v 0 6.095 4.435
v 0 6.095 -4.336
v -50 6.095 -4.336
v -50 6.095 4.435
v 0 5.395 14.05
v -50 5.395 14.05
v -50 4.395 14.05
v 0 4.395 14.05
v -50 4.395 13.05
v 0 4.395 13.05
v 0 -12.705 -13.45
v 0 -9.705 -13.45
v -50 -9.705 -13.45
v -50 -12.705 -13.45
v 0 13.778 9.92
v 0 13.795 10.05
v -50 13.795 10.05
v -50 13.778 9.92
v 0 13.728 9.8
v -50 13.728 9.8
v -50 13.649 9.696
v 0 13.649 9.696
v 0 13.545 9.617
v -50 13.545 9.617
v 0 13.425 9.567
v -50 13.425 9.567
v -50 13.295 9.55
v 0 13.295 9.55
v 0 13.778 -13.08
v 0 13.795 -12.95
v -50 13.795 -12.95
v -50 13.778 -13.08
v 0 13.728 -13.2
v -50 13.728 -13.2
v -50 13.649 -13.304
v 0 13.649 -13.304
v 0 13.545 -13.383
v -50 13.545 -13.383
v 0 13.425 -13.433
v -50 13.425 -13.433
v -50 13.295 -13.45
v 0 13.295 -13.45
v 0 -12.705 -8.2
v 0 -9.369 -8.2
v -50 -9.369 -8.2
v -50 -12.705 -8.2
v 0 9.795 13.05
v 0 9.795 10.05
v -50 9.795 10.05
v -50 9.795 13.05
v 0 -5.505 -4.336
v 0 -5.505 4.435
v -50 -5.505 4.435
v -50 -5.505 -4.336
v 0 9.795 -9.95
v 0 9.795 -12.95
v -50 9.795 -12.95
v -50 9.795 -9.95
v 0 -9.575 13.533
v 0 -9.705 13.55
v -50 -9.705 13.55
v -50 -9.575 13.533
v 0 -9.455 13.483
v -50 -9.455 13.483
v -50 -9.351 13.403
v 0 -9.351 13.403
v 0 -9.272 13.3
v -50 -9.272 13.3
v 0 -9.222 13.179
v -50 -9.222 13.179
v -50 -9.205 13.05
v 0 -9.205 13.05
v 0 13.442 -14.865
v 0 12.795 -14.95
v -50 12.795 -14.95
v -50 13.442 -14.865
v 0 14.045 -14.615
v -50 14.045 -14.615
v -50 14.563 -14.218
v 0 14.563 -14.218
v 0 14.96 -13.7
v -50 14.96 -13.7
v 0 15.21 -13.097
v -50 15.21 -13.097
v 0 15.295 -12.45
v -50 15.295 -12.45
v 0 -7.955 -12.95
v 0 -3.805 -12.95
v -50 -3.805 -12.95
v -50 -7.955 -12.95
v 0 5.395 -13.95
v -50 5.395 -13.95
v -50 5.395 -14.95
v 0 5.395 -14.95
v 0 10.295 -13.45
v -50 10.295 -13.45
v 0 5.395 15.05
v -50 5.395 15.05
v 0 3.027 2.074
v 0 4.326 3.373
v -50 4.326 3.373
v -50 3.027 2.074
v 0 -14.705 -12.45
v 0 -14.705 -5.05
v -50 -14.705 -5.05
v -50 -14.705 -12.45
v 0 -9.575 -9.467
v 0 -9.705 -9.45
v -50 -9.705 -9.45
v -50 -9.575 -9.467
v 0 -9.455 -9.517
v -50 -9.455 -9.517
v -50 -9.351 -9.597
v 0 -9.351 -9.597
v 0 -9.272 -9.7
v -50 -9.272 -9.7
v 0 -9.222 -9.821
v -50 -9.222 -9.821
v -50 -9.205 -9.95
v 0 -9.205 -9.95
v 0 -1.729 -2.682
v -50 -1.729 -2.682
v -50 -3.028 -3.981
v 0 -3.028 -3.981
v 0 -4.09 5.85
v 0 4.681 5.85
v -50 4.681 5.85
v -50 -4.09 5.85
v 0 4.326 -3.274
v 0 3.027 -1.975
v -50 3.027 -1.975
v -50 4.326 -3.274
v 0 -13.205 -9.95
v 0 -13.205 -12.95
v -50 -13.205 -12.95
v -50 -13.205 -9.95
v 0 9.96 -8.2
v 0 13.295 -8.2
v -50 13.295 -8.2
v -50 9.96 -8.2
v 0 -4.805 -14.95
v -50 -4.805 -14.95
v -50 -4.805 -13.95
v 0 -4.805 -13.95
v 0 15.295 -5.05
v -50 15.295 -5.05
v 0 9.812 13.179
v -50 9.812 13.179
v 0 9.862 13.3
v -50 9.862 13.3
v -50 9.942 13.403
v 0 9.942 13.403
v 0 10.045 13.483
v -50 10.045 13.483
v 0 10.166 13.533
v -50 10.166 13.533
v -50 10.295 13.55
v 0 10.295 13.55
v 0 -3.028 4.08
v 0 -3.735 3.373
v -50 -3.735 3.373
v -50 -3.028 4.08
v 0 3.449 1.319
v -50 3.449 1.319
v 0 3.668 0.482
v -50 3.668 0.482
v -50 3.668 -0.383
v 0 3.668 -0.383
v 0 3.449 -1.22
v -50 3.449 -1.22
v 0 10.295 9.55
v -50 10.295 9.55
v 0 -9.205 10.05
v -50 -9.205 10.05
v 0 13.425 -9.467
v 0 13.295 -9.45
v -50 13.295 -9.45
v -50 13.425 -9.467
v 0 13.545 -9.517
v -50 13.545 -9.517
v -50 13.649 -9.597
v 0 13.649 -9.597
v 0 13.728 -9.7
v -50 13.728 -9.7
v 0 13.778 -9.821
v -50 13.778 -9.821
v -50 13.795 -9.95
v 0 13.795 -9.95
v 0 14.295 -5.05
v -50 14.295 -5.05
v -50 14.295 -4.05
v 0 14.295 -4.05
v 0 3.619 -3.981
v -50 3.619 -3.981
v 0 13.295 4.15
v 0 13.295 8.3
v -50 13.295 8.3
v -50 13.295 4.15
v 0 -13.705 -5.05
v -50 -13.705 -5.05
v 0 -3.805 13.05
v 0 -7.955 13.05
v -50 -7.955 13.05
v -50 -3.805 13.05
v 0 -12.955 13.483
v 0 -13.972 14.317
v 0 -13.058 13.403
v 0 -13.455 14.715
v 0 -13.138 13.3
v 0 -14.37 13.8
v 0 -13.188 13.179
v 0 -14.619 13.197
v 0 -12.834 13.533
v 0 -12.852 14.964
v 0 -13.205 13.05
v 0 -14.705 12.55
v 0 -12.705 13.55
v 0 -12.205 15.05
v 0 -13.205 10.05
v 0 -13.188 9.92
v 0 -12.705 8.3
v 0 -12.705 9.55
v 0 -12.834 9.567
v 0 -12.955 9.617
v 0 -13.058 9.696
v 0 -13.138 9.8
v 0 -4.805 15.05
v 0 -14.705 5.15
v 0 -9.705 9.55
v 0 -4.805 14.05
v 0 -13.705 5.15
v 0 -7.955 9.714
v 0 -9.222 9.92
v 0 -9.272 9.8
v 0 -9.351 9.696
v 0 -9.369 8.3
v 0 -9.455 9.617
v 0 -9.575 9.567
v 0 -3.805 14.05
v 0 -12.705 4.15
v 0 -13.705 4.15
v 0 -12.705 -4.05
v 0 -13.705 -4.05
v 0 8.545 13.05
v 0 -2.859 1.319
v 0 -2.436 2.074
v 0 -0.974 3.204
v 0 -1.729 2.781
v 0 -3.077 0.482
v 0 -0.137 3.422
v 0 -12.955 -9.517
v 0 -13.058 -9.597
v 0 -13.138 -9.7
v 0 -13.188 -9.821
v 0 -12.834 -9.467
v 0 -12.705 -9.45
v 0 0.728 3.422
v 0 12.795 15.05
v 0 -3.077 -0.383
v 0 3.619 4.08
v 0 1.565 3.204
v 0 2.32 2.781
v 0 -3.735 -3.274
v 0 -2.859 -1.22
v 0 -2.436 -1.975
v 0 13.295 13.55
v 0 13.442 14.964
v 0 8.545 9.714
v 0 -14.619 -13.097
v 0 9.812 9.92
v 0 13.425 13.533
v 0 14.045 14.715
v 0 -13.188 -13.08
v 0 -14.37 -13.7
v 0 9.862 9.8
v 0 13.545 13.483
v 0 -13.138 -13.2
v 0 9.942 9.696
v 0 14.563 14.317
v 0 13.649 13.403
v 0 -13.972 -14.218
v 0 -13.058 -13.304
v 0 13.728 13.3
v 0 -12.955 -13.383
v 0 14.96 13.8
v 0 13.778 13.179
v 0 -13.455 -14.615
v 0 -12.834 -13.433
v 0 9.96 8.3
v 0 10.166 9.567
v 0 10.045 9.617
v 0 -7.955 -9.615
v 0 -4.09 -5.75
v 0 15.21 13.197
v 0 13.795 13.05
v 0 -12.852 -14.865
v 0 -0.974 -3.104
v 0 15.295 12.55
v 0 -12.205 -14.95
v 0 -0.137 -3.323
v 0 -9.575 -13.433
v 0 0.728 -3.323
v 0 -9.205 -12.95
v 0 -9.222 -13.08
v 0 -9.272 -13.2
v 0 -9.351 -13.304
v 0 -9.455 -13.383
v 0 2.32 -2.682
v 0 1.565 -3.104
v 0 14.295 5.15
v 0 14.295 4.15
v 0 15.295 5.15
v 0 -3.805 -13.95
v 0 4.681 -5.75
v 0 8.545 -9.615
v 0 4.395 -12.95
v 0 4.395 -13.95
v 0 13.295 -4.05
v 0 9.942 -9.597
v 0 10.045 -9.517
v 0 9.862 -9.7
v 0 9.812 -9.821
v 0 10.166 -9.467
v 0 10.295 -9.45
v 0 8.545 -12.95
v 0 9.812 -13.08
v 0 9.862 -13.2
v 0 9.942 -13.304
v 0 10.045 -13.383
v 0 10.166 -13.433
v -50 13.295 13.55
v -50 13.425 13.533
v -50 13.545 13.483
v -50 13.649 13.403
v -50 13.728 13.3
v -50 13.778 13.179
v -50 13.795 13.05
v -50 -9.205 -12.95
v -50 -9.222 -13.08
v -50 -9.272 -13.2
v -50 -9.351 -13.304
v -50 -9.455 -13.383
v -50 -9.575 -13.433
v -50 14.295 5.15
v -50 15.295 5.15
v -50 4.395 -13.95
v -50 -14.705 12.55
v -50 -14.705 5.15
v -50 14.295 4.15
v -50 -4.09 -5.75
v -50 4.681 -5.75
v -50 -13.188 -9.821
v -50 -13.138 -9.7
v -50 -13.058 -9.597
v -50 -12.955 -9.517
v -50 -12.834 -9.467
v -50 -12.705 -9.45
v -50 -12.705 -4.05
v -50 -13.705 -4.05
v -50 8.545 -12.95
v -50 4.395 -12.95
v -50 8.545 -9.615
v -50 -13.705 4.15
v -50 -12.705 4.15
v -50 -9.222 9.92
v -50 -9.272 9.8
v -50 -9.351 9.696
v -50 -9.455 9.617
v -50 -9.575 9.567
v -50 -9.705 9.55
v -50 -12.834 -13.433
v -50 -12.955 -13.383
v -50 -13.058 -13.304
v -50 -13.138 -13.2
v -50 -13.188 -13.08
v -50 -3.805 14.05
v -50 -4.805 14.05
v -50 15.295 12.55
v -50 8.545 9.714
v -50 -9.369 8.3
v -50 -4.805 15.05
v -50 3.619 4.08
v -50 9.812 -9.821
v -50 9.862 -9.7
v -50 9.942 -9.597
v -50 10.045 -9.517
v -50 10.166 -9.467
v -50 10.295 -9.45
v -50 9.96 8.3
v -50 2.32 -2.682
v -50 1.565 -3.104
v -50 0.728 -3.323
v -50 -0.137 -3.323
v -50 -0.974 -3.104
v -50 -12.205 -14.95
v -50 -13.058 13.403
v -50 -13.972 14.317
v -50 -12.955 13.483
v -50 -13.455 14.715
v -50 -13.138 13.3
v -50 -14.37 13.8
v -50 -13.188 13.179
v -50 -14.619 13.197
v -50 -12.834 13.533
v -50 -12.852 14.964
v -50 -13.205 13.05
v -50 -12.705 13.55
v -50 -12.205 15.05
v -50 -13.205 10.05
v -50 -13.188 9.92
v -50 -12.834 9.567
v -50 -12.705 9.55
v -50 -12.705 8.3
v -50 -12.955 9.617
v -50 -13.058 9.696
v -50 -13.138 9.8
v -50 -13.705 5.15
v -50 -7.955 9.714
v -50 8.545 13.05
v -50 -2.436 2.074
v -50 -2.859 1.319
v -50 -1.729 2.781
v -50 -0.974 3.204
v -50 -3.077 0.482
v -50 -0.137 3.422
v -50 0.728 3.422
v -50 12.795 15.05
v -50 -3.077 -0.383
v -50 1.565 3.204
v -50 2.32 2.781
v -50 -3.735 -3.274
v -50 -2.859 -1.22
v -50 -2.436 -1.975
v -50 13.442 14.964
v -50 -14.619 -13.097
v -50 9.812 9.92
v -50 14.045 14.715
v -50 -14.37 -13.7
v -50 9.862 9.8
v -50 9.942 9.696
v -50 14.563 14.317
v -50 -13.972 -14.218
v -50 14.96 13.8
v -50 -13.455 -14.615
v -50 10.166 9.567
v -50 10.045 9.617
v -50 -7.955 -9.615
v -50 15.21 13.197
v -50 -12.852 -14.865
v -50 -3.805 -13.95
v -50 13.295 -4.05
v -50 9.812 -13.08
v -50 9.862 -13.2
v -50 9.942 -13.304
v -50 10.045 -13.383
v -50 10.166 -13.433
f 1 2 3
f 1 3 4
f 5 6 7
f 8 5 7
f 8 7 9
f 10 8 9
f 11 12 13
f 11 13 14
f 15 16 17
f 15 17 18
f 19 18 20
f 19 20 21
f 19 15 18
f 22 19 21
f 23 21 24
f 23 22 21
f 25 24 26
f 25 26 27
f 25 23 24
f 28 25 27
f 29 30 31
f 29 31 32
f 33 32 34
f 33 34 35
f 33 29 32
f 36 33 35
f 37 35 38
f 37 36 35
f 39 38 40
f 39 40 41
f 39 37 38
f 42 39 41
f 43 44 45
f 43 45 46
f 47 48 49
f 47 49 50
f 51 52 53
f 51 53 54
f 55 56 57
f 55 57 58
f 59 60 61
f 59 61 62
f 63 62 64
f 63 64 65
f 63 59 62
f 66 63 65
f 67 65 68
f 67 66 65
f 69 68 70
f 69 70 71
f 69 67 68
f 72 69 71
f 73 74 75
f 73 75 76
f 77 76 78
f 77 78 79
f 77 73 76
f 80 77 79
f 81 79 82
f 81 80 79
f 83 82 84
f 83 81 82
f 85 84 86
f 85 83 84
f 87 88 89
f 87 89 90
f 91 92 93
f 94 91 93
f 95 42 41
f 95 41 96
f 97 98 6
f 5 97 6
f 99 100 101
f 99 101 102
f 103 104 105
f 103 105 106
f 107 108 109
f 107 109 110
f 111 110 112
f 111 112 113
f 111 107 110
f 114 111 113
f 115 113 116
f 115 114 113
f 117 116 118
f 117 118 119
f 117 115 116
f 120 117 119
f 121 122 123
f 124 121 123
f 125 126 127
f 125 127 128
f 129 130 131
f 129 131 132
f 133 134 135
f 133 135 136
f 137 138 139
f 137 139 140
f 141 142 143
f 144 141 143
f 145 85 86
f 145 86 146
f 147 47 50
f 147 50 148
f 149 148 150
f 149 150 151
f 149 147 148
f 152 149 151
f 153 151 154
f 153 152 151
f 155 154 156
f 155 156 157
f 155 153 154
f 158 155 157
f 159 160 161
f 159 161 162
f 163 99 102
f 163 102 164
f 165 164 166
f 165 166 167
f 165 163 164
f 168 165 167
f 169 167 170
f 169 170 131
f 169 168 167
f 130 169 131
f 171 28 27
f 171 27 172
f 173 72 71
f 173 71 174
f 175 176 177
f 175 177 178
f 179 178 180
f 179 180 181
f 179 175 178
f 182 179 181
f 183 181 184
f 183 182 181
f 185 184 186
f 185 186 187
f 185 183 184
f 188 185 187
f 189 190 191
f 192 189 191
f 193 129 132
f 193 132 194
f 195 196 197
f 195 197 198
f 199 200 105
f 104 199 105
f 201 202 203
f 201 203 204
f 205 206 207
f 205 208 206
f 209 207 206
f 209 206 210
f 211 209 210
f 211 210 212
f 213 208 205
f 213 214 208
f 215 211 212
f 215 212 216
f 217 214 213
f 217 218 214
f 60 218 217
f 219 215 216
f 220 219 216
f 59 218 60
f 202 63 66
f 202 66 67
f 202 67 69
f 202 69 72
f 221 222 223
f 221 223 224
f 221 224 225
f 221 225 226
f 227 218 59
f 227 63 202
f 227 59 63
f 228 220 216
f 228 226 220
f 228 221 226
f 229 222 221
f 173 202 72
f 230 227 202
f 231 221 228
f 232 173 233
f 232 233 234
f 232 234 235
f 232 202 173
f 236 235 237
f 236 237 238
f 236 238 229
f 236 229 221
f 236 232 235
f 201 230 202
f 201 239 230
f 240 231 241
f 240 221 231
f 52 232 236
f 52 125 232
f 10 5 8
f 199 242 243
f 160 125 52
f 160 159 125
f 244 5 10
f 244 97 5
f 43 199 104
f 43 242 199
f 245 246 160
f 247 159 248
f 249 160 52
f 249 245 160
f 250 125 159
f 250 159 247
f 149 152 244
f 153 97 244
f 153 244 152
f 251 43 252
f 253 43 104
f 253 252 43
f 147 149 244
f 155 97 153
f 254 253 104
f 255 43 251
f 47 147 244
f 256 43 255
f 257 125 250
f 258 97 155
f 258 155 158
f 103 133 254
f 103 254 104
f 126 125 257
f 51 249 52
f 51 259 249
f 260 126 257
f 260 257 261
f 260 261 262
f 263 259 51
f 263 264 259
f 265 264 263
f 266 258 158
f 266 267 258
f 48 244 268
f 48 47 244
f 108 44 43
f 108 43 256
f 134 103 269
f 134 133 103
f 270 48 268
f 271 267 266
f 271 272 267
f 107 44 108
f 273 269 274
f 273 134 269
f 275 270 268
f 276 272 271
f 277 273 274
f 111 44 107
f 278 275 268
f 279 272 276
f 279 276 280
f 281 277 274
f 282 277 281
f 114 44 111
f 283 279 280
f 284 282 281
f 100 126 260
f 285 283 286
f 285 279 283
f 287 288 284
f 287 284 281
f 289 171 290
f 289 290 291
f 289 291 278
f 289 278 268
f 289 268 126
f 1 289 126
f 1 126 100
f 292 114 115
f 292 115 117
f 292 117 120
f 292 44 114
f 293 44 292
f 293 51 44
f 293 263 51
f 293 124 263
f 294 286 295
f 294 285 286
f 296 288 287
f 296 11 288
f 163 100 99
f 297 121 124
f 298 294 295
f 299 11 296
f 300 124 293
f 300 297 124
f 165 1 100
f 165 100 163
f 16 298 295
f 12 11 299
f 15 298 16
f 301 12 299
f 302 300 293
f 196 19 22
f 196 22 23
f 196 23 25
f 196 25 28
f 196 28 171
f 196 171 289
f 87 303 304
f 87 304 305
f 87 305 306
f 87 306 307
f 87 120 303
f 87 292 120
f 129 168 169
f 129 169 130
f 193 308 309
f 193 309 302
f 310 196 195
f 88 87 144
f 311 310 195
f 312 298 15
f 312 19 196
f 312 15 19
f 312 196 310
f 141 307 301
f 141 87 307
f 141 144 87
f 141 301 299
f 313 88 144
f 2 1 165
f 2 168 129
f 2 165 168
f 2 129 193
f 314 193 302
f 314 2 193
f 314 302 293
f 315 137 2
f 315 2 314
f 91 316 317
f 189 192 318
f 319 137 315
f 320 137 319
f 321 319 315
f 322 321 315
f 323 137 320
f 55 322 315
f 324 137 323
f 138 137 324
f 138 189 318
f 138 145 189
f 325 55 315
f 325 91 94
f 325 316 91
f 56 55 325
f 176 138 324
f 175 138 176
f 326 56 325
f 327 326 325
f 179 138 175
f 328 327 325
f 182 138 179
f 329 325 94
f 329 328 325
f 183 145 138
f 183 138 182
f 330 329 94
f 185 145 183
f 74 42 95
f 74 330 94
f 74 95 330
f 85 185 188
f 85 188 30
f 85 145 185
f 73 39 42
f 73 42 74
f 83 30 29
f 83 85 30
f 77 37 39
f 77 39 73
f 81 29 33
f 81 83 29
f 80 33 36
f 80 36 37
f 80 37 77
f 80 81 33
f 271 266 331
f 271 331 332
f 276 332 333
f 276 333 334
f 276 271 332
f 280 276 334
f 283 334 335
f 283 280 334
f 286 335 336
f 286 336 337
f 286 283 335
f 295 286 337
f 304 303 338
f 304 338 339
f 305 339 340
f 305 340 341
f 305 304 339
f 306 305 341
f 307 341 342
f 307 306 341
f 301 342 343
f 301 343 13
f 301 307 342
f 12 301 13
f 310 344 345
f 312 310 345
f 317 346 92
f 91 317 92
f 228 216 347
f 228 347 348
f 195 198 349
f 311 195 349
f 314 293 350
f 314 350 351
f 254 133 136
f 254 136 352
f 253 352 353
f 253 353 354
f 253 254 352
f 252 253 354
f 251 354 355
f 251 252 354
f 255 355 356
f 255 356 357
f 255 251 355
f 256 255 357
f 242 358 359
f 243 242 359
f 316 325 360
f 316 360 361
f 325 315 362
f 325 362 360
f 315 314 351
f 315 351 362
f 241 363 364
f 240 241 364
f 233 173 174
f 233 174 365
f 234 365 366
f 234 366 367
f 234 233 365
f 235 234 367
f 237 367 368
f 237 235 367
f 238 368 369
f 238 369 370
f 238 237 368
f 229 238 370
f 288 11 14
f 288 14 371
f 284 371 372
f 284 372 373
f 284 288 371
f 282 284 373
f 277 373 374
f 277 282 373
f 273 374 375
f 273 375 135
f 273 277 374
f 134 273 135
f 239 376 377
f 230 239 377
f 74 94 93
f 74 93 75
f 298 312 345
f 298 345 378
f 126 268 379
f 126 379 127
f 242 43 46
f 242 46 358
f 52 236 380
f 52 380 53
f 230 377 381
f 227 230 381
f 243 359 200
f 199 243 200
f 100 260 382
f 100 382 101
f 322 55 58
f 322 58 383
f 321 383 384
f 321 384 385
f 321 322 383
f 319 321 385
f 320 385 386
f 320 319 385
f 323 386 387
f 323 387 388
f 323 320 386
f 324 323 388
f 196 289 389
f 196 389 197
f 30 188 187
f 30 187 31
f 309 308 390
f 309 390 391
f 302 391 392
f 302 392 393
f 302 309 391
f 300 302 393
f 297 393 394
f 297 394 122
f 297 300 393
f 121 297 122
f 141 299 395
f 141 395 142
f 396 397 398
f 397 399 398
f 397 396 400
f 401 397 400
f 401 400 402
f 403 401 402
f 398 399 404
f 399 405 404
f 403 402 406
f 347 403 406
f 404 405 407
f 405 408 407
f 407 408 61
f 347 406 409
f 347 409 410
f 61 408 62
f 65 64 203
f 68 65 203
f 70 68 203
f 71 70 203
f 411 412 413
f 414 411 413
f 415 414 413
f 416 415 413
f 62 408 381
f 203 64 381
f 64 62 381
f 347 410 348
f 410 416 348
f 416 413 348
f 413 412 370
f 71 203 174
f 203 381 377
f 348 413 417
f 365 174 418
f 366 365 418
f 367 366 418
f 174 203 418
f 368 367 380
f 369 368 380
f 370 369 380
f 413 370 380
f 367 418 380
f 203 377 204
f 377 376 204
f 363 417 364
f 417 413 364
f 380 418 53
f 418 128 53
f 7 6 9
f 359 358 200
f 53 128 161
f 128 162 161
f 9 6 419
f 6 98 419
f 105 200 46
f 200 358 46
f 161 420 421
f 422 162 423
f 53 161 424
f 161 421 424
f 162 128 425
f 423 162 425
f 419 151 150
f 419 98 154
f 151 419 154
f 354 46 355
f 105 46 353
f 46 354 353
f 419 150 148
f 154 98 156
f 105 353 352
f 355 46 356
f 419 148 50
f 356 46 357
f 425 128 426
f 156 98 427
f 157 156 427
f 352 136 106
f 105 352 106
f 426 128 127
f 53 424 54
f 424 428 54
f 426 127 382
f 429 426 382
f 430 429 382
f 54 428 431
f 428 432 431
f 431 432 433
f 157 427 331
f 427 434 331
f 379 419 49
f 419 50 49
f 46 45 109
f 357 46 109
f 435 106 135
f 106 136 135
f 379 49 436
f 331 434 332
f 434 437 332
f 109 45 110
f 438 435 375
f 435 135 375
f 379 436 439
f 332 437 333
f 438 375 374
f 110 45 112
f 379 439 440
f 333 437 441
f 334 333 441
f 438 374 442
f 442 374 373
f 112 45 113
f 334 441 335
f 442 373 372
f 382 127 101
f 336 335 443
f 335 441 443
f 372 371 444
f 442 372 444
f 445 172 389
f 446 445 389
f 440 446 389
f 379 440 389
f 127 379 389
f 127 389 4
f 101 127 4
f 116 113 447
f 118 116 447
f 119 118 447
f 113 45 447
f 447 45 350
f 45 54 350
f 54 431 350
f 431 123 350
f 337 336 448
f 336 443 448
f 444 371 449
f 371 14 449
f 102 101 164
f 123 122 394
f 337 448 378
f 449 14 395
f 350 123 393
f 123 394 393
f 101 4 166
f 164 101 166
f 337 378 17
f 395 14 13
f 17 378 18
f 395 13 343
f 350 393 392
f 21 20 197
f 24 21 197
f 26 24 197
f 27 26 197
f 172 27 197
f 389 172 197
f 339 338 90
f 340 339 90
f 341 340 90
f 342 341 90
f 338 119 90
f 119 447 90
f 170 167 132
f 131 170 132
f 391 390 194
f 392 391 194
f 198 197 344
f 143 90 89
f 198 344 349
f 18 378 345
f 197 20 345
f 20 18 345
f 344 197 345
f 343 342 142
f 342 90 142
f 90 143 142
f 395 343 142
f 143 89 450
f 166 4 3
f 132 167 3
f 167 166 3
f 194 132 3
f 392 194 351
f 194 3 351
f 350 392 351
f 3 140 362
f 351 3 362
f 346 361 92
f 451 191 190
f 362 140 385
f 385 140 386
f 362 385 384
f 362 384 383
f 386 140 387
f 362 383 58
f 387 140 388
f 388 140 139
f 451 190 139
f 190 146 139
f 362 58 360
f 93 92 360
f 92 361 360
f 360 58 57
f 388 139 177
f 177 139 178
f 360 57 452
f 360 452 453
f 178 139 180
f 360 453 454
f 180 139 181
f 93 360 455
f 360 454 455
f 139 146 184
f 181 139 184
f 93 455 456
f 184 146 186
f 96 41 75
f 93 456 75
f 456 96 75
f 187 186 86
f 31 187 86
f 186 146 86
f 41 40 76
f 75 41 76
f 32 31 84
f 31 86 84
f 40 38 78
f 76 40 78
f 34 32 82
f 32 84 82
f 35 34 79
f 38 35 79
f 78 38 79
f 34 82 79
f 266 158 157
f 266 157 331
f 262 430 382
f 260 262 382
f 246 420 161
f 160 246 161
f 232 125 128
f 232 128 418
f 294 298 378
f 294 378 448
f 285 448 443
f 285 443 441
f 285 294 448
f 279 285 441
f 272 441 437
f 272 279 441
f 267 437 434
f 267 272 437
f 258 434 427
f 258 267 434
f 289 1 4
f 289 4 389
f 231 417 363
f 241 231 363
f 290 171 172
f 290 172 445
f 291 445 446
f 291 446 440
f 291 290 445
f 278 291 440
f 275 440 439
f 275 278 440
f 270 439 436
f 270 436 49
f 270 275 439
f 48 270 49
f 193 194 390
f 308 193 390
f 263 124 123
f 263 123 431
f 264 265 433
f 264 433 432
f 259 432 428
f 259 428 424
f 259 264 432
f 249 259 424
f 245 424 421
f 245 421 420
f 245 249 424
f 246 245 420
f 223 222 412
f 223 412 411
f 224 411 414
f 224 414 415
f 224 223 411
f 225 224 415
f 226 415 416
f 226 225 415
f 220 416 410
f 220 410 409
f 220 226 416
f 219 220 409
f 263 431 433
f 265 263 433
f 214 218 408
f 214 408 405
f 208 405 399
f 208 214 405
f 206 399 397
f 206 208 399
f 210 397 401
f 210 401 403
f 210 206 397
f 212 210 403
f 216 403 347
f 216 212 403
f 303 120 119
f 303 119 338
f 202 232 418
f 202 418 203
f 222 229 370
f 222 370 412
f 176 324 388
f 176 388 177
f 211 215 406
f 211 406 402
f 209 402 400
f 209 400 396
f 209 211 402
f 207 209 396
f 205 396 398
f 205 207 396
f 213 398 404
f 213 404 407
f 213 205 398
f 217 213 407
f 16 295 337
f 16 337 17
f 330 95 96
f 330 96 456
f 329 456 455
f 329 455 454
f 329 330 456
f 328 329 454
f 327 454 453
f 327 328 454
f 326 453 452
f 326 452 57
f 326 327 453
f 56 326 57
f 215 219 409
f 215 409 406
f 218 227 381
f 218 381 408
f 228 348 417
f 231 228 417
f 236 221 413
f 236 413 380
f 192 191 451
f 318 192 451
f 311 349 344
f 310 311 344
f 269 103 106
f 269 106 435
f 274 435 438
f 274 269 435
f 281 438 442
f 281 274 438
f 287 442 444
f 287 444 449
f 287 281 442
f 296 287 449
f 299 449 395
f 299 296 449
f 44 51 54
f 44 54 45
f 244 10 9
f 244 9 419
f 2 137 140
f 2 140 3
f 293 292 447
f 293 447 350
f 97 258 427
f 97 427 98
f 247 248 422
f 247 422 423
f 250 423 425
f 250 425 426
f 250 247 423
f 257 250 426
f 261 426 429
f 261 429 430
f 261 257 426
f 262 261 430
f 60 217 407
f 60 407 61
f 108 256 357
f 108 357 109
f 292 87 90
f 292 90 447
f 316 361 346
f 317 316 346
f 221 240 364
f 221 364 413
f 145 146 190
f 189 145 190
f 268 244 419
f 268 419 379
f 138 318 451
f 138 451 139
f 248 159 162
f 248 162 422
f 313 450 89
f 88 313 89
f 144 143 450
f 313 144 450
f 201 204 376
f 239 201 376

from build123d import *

# Parameters (mm, degrees)
EXTRUDE_1_DEPTH = 50


with BuildPart() as part:
    # 草图1 → 凸台-拉伸1 (new body)
    with BuildSketch(Plane(origin=(0, 0, 0), x_dir=(0, 0, -1), z_dir=(1, 0, 0))):
        with BuildLine():
            Line((-5.14957074, -13.70467014), (-4.14957074, -13.70467014))
            Line((-4.14957074, -13.70467014), (-4.14957074, -12.70467014))
            Line((-4.14957074, -12.70467014), (-8.29957074, -12.70467014))
            Line((-8.29957074, -12.70467014), (-8.29957074, -9.3688837))
            Line((-8.29957074, -9.3688837), (-4.43535718, -5.50467014))
            Line((-4.43535718, -5.50467014), (4.3362157, -5.50467014))
            Line((4.3362157, -5.50467014), (8.20042926, -9.3688837))
            Line((8.20042926, -9.3688837), (8.20042926, -12.70467014))
            Line((8.20042926, -12.70467014), (4.05042926, -12.70467014))
            Line((4.05042926, -12.70467014), (4.05042926, -13.70467014))
            Line((4.05042926, -13.70467014), (5.05042926, -13.70467014))
            Line((5.05042926, -13.70467014), (5.05042926, -14.70467014))
            Line((5.05042926, -14.70467014), (12.45042926, -14.70467014))
            ThreePointArc((12.45042926, -14.70467014), (14.218196213, -13.972437093), (14.95042926, -12.20467014))
            Line((14.95042926, -12.20467014), (14.95042926, -4.80467014))
            Line((14.95042926, -4.80467014), (13.95042926, -4.80467014))
            Line((13.95042926, -4.80467014), (13.95042926, -3.80467014))
            Line((13.95042926, -3.80467014), (12.95042926, -3.80467014))
            Line((12.95042926, -3.80467014), (12.95042926, -7.95467014))
            Line((12.95042926, -7.95467014), (9.61464282, -7.95467014))
            Line((9.61464282, -7.95467014), (5.75042926, -4.09045658))
            Line((5.75042926, -4.09045658), (5.75042926, 4.6811163))
            Line((5.75042926, 4.6811163), (9.61464282, 8.54532986))
            Line((9.61464282, 8.54532986), (12.95042926, 8.54532986))
            Line((12.95042926, 8.54532986), (12.95042926, 4.39532986))
            Line((12.95042926, 4.39532986), (13.95042926, 4.39532986))
            Line((13.95042926, 4.39532986), (13.95042926, 5.39532986))
            Line((13.95042926, 5.39532986), (14.95042926, 5.39532986))
            Line((14.95042926, 5.39532986), (14.95042926, 12.79532986))
            ThreePointArc((14.95042926, 12.79532986), (14.218196213, 14.563096813), (12.45042926, 15.29532986))
            Line((12.45042926, 15.29532986), (5.05042926, 15.29532986))
            Line((5.05042926, 15.29532986), (5.05042926, 14.29532986))
            Line((5.05042926, 14.29532986), (4.05042926, 14.29532986))
            Line((4.05042926, 14.29532986), (4.05042926, 13.29532986))
            Line((4.05042926, 13.29532986), (8.20042926, 13.29532986))
            Line((8.20042926, 13.29532986), (8.20042926, 9.95954342))
            Line((8.20042926, 9.95954342), (4.3362157, 6.09532986))
            Line((4.3362157, 6.09532986), (-4.43535718, 6.09532986))
            Line((-4.43535718, 6.09532986), (-8.29957074, 9.95954342))
            Line((-8.29957074, 9.95954342), (-8.29957074, 13.29532986))
            Line((-8.29957074, 13.29532986), (-4.14957074, 13.29532986))
            Line((-4.14957074, 13.29532986), (-4.14957074, 14.29532986))
            Line((-4.14957074, 14.29532986), (-5.14957074, 14.29532986))
            Line((-5.14957074, 14.29532986), (-5.14957074, 15.29532986))
            Line((-5.14957074, 15.29532986), (-12.54957074, 15.29532986))
            ThreePointArc((-12.54957074, 15.29532986), (-14.317337693, 14.563096813), (-15.04957074, 12.79532986))
            Line((-15.04957074, 12.79532986), (-15.04957074, 5.39532986))
            Line((-15.04957074, 5.39532986), (-14.04957074, 5.39532986))
            Line((-14.04957074, 5.39532986), (-14.04957074, 4.39532986))
            Line((-14.04957074, 4.39532986), (-13.04957074, 4.39532986))
            Line((-13.04957074, 4.39532986), (-13.04957074, 8.54532986))
            Line((-13.04957074, 8.54532986), (-9.7137843, 8.54532986))
            Line((-9.7137843, 8.54532986), (-5.84957074, 4.6811163))
            Line((-5.84957074, 4.6811163), (-5.84957074, -4.09045658))
            Line((-5.84957074, -4.09045658), (-9.7137843, -7.95467014))
            Line((-9.7137843, -7.95467014), (-13.04957074, -7.95467014))
            Line((-13.04957074, -7.95467014), (-13.04957074, -3.80467014))
            Line((-13.04957074, -3.80467014), (-14.04957074, -3.80467014))
            Line((-14.04957074, -3.80467014), (-14.04957074, -4.80467014))
            Line((-14.04957074, -4.80467014), (-15.04957074, -4.80467014))
            Line((-15.04957074, -4.80467014), (-15.04957074, -12.20467014))
            ThreePointArc((-15.04957074, -12.20467014), (-14.317337693, -13.972437093), (-12.54957074, -14.70467014))
            Line((-12.54957074, -14.70467014), (-5.14957074, -14.70467014))
            Line((-5.14957074, -14.70467014), (-5.14957074, -13.70467014))
        make_face()
        with BuildLine():
            Line((-10.04957074, 9.79532986), (-13.04957074, 9.79532986))
            ThreePointArc((-13.04957074, 9.79532986), (-13.403124131, 9.941776469), (-13.54957074, 10.29532986))
            Line((-13.54957074, 10.29532986), (-13.54957074, 13.29532986))
            ThreePointArc((-13.54957074, 13.29532986), (-13.403124131, 13.648883251), (-13.04957074, 13.79532986))
            Line((-13.04957074, 13.79532986), (-10.04957074, 13.79532986))
            ThreePointArc((-10.04957074, 13.79532986), (-9.696017349, 13.648883251), (-9.54957074, 13.29532986))
            Line((-9.54957074, 13.29532986), (-9.54957074, 10.29532986))
            ThreePointArc((-9.54957074, 10.29532986), (-9.696017349, 9.941776469), (-10.04957074, 9.79532986))
        make_face(mode=Mode.SUBTRACT)
        with BuildLine():
            Line((-10.04957074, -13.20467014), (-13.04957074, -13.20467014))
            ThreePointArc((-13.04957074, -13.20467014), (-13.403124131, -13.058223531), (-13.54957074, -12.70467014))
            Line((-13.54957074, -12.70467014), (-13.54957074, -9.70467014))
            ThreePointArc((-13.54957074, -9.70467014), (-13.403124131, -9.351116749), (-13.04957074, -9.20467014))
            Line((-13.04957074, -9.20467014), (-10.04957074, -9.20467014))
            ThreePointArc((-10.04957074, -9.20467014), (-9.696017349, -9.351116749), (-9.54957074, -9.70467014))
            Line((-9.54957074, -9.70467014), (-9.54957074, -12.70467014))
            ThreePointArc((-9.54957074, -12.70467014), (-9.696017349, -13.058223531), (-10.04957074, -13.20467014))
        make_face(mode=Mode.SUBTRACT)
        with BuildLine():
            Line((12.95042926, 9.79532986), (9.95042926, 9.79532986))
            ThreePointArc((9.95042926, 9.79532986), (9.596875869, 9.941776469), (9.45042926, 10.29532986))
            Line((9.45042926, 10.29532986), (9.45042926, 13.29532986))
            ThreePointArc((9.45042926, 13.29532986), (9.596875869, 13.648883251), (9.95042926, 13.79532986))
            Line((9.95042926, 13.79532986), (12.95042926, 13.79532986))
            ThreePointArc((12.95042926, 13.79532986), (13.303982651, 13.648883251), (13.45042926, 13.29532986))
            Line((13.45042926, 13.29532986), (13.45042926, 10.29532986))
            ThreePointArc((13.45042926, 10.29532986), (13.303982651, 9.941776469), (12.95042926, 9.79532986))
        make_face(mode=Mode.SUBTRACT)
        with BuildLine():
            Line((13.45042926, -9.70467014), (13.45042926, -12.70467014))
            ThreePointArc((13.45042926, -12.70467014), (13.303982651, -13.058223531), (12.95042926, -13.20467014))
            Line((12.95042926, -13.20467014), (9.95042926, -13.20467014))
            ThreePointArc((9.95042926, -13.20467014), (9.596875869, -13.058223531), (9.45042926, -12.70467014))
            Line((9.45042926, -12.70467014), (9.45042926, -9.70467014))
            ThreePointArc((9.45042926, -9.70467014), (9.596875869, -9.351116749), (9.95042926, -9.20467014))
            Line((9.95042926, -9.20467014), (12.95042926, -9.20467014))
            ThreePointArc((12.95042926, -9.20467014), (13.303982651, -9.351116749), (13.45042926, -9.70467014))
        make_face(mode=Mode.SUBTRACT)
        with BuildLine():
            Line((-4.07998961, 3.61864195), (-3.37288283, 4.32574873))
            Line((-3.37288283, 4.32574873), (-2.07404174, 3.02690764))
            ThreePointArc((-2.07404174, 3.02690764), (-0.04957074, 3.69532986), (1.97490026, 3.02690764))
            Line((1.97490026, 3.02690764), (3.27374135, 4.32574873))
            Line((3.27374135, 4.32574873), (3.98084813, 3.61864195))
            Line((3.98084813, 3.61864195), (2.68200704, 2.31980086))
            ThreePointArc((2.68200704, 2.31980086), (3.35042926, 0.29532986), (2.68200704, -1.72914114))
            Line((2.68200704, -1.72914114), (3.98084813, -3.02798223))
            Line((3.98084813, -3.02798223), (3.27374135, -3.73508901))
            Line((3.27374135, -3.73508901), (1.97490026, -2.43624792))
            ThreePointArc((1.97490026, -2.43624792), (-0.04957074, -3.10467014), (-2.07404174, -2.43624792))
            Line((-2.07404174, -2.43624792), (-3.37288283, -3.73508901))
            Line((-3.37288283, -3.73508901), (-4.07998961, -3.02798223))
            Line((-4.07998961, -3.02798223), (-2.78114852, -1.72914114))
            ThreePointArc((-2.78114852, -1.72914114), (-3.44957074, 0.29532986), (-2.78114852, 2.31980086))
            Line((-2.78114852, 2.31980086), (-4.07998961, 3.61864195))
        make_face(mode=Mode.SUBTRACT)
    extrude(amount=-EXTRUDE_1_DEPTH)


solid = part.part
